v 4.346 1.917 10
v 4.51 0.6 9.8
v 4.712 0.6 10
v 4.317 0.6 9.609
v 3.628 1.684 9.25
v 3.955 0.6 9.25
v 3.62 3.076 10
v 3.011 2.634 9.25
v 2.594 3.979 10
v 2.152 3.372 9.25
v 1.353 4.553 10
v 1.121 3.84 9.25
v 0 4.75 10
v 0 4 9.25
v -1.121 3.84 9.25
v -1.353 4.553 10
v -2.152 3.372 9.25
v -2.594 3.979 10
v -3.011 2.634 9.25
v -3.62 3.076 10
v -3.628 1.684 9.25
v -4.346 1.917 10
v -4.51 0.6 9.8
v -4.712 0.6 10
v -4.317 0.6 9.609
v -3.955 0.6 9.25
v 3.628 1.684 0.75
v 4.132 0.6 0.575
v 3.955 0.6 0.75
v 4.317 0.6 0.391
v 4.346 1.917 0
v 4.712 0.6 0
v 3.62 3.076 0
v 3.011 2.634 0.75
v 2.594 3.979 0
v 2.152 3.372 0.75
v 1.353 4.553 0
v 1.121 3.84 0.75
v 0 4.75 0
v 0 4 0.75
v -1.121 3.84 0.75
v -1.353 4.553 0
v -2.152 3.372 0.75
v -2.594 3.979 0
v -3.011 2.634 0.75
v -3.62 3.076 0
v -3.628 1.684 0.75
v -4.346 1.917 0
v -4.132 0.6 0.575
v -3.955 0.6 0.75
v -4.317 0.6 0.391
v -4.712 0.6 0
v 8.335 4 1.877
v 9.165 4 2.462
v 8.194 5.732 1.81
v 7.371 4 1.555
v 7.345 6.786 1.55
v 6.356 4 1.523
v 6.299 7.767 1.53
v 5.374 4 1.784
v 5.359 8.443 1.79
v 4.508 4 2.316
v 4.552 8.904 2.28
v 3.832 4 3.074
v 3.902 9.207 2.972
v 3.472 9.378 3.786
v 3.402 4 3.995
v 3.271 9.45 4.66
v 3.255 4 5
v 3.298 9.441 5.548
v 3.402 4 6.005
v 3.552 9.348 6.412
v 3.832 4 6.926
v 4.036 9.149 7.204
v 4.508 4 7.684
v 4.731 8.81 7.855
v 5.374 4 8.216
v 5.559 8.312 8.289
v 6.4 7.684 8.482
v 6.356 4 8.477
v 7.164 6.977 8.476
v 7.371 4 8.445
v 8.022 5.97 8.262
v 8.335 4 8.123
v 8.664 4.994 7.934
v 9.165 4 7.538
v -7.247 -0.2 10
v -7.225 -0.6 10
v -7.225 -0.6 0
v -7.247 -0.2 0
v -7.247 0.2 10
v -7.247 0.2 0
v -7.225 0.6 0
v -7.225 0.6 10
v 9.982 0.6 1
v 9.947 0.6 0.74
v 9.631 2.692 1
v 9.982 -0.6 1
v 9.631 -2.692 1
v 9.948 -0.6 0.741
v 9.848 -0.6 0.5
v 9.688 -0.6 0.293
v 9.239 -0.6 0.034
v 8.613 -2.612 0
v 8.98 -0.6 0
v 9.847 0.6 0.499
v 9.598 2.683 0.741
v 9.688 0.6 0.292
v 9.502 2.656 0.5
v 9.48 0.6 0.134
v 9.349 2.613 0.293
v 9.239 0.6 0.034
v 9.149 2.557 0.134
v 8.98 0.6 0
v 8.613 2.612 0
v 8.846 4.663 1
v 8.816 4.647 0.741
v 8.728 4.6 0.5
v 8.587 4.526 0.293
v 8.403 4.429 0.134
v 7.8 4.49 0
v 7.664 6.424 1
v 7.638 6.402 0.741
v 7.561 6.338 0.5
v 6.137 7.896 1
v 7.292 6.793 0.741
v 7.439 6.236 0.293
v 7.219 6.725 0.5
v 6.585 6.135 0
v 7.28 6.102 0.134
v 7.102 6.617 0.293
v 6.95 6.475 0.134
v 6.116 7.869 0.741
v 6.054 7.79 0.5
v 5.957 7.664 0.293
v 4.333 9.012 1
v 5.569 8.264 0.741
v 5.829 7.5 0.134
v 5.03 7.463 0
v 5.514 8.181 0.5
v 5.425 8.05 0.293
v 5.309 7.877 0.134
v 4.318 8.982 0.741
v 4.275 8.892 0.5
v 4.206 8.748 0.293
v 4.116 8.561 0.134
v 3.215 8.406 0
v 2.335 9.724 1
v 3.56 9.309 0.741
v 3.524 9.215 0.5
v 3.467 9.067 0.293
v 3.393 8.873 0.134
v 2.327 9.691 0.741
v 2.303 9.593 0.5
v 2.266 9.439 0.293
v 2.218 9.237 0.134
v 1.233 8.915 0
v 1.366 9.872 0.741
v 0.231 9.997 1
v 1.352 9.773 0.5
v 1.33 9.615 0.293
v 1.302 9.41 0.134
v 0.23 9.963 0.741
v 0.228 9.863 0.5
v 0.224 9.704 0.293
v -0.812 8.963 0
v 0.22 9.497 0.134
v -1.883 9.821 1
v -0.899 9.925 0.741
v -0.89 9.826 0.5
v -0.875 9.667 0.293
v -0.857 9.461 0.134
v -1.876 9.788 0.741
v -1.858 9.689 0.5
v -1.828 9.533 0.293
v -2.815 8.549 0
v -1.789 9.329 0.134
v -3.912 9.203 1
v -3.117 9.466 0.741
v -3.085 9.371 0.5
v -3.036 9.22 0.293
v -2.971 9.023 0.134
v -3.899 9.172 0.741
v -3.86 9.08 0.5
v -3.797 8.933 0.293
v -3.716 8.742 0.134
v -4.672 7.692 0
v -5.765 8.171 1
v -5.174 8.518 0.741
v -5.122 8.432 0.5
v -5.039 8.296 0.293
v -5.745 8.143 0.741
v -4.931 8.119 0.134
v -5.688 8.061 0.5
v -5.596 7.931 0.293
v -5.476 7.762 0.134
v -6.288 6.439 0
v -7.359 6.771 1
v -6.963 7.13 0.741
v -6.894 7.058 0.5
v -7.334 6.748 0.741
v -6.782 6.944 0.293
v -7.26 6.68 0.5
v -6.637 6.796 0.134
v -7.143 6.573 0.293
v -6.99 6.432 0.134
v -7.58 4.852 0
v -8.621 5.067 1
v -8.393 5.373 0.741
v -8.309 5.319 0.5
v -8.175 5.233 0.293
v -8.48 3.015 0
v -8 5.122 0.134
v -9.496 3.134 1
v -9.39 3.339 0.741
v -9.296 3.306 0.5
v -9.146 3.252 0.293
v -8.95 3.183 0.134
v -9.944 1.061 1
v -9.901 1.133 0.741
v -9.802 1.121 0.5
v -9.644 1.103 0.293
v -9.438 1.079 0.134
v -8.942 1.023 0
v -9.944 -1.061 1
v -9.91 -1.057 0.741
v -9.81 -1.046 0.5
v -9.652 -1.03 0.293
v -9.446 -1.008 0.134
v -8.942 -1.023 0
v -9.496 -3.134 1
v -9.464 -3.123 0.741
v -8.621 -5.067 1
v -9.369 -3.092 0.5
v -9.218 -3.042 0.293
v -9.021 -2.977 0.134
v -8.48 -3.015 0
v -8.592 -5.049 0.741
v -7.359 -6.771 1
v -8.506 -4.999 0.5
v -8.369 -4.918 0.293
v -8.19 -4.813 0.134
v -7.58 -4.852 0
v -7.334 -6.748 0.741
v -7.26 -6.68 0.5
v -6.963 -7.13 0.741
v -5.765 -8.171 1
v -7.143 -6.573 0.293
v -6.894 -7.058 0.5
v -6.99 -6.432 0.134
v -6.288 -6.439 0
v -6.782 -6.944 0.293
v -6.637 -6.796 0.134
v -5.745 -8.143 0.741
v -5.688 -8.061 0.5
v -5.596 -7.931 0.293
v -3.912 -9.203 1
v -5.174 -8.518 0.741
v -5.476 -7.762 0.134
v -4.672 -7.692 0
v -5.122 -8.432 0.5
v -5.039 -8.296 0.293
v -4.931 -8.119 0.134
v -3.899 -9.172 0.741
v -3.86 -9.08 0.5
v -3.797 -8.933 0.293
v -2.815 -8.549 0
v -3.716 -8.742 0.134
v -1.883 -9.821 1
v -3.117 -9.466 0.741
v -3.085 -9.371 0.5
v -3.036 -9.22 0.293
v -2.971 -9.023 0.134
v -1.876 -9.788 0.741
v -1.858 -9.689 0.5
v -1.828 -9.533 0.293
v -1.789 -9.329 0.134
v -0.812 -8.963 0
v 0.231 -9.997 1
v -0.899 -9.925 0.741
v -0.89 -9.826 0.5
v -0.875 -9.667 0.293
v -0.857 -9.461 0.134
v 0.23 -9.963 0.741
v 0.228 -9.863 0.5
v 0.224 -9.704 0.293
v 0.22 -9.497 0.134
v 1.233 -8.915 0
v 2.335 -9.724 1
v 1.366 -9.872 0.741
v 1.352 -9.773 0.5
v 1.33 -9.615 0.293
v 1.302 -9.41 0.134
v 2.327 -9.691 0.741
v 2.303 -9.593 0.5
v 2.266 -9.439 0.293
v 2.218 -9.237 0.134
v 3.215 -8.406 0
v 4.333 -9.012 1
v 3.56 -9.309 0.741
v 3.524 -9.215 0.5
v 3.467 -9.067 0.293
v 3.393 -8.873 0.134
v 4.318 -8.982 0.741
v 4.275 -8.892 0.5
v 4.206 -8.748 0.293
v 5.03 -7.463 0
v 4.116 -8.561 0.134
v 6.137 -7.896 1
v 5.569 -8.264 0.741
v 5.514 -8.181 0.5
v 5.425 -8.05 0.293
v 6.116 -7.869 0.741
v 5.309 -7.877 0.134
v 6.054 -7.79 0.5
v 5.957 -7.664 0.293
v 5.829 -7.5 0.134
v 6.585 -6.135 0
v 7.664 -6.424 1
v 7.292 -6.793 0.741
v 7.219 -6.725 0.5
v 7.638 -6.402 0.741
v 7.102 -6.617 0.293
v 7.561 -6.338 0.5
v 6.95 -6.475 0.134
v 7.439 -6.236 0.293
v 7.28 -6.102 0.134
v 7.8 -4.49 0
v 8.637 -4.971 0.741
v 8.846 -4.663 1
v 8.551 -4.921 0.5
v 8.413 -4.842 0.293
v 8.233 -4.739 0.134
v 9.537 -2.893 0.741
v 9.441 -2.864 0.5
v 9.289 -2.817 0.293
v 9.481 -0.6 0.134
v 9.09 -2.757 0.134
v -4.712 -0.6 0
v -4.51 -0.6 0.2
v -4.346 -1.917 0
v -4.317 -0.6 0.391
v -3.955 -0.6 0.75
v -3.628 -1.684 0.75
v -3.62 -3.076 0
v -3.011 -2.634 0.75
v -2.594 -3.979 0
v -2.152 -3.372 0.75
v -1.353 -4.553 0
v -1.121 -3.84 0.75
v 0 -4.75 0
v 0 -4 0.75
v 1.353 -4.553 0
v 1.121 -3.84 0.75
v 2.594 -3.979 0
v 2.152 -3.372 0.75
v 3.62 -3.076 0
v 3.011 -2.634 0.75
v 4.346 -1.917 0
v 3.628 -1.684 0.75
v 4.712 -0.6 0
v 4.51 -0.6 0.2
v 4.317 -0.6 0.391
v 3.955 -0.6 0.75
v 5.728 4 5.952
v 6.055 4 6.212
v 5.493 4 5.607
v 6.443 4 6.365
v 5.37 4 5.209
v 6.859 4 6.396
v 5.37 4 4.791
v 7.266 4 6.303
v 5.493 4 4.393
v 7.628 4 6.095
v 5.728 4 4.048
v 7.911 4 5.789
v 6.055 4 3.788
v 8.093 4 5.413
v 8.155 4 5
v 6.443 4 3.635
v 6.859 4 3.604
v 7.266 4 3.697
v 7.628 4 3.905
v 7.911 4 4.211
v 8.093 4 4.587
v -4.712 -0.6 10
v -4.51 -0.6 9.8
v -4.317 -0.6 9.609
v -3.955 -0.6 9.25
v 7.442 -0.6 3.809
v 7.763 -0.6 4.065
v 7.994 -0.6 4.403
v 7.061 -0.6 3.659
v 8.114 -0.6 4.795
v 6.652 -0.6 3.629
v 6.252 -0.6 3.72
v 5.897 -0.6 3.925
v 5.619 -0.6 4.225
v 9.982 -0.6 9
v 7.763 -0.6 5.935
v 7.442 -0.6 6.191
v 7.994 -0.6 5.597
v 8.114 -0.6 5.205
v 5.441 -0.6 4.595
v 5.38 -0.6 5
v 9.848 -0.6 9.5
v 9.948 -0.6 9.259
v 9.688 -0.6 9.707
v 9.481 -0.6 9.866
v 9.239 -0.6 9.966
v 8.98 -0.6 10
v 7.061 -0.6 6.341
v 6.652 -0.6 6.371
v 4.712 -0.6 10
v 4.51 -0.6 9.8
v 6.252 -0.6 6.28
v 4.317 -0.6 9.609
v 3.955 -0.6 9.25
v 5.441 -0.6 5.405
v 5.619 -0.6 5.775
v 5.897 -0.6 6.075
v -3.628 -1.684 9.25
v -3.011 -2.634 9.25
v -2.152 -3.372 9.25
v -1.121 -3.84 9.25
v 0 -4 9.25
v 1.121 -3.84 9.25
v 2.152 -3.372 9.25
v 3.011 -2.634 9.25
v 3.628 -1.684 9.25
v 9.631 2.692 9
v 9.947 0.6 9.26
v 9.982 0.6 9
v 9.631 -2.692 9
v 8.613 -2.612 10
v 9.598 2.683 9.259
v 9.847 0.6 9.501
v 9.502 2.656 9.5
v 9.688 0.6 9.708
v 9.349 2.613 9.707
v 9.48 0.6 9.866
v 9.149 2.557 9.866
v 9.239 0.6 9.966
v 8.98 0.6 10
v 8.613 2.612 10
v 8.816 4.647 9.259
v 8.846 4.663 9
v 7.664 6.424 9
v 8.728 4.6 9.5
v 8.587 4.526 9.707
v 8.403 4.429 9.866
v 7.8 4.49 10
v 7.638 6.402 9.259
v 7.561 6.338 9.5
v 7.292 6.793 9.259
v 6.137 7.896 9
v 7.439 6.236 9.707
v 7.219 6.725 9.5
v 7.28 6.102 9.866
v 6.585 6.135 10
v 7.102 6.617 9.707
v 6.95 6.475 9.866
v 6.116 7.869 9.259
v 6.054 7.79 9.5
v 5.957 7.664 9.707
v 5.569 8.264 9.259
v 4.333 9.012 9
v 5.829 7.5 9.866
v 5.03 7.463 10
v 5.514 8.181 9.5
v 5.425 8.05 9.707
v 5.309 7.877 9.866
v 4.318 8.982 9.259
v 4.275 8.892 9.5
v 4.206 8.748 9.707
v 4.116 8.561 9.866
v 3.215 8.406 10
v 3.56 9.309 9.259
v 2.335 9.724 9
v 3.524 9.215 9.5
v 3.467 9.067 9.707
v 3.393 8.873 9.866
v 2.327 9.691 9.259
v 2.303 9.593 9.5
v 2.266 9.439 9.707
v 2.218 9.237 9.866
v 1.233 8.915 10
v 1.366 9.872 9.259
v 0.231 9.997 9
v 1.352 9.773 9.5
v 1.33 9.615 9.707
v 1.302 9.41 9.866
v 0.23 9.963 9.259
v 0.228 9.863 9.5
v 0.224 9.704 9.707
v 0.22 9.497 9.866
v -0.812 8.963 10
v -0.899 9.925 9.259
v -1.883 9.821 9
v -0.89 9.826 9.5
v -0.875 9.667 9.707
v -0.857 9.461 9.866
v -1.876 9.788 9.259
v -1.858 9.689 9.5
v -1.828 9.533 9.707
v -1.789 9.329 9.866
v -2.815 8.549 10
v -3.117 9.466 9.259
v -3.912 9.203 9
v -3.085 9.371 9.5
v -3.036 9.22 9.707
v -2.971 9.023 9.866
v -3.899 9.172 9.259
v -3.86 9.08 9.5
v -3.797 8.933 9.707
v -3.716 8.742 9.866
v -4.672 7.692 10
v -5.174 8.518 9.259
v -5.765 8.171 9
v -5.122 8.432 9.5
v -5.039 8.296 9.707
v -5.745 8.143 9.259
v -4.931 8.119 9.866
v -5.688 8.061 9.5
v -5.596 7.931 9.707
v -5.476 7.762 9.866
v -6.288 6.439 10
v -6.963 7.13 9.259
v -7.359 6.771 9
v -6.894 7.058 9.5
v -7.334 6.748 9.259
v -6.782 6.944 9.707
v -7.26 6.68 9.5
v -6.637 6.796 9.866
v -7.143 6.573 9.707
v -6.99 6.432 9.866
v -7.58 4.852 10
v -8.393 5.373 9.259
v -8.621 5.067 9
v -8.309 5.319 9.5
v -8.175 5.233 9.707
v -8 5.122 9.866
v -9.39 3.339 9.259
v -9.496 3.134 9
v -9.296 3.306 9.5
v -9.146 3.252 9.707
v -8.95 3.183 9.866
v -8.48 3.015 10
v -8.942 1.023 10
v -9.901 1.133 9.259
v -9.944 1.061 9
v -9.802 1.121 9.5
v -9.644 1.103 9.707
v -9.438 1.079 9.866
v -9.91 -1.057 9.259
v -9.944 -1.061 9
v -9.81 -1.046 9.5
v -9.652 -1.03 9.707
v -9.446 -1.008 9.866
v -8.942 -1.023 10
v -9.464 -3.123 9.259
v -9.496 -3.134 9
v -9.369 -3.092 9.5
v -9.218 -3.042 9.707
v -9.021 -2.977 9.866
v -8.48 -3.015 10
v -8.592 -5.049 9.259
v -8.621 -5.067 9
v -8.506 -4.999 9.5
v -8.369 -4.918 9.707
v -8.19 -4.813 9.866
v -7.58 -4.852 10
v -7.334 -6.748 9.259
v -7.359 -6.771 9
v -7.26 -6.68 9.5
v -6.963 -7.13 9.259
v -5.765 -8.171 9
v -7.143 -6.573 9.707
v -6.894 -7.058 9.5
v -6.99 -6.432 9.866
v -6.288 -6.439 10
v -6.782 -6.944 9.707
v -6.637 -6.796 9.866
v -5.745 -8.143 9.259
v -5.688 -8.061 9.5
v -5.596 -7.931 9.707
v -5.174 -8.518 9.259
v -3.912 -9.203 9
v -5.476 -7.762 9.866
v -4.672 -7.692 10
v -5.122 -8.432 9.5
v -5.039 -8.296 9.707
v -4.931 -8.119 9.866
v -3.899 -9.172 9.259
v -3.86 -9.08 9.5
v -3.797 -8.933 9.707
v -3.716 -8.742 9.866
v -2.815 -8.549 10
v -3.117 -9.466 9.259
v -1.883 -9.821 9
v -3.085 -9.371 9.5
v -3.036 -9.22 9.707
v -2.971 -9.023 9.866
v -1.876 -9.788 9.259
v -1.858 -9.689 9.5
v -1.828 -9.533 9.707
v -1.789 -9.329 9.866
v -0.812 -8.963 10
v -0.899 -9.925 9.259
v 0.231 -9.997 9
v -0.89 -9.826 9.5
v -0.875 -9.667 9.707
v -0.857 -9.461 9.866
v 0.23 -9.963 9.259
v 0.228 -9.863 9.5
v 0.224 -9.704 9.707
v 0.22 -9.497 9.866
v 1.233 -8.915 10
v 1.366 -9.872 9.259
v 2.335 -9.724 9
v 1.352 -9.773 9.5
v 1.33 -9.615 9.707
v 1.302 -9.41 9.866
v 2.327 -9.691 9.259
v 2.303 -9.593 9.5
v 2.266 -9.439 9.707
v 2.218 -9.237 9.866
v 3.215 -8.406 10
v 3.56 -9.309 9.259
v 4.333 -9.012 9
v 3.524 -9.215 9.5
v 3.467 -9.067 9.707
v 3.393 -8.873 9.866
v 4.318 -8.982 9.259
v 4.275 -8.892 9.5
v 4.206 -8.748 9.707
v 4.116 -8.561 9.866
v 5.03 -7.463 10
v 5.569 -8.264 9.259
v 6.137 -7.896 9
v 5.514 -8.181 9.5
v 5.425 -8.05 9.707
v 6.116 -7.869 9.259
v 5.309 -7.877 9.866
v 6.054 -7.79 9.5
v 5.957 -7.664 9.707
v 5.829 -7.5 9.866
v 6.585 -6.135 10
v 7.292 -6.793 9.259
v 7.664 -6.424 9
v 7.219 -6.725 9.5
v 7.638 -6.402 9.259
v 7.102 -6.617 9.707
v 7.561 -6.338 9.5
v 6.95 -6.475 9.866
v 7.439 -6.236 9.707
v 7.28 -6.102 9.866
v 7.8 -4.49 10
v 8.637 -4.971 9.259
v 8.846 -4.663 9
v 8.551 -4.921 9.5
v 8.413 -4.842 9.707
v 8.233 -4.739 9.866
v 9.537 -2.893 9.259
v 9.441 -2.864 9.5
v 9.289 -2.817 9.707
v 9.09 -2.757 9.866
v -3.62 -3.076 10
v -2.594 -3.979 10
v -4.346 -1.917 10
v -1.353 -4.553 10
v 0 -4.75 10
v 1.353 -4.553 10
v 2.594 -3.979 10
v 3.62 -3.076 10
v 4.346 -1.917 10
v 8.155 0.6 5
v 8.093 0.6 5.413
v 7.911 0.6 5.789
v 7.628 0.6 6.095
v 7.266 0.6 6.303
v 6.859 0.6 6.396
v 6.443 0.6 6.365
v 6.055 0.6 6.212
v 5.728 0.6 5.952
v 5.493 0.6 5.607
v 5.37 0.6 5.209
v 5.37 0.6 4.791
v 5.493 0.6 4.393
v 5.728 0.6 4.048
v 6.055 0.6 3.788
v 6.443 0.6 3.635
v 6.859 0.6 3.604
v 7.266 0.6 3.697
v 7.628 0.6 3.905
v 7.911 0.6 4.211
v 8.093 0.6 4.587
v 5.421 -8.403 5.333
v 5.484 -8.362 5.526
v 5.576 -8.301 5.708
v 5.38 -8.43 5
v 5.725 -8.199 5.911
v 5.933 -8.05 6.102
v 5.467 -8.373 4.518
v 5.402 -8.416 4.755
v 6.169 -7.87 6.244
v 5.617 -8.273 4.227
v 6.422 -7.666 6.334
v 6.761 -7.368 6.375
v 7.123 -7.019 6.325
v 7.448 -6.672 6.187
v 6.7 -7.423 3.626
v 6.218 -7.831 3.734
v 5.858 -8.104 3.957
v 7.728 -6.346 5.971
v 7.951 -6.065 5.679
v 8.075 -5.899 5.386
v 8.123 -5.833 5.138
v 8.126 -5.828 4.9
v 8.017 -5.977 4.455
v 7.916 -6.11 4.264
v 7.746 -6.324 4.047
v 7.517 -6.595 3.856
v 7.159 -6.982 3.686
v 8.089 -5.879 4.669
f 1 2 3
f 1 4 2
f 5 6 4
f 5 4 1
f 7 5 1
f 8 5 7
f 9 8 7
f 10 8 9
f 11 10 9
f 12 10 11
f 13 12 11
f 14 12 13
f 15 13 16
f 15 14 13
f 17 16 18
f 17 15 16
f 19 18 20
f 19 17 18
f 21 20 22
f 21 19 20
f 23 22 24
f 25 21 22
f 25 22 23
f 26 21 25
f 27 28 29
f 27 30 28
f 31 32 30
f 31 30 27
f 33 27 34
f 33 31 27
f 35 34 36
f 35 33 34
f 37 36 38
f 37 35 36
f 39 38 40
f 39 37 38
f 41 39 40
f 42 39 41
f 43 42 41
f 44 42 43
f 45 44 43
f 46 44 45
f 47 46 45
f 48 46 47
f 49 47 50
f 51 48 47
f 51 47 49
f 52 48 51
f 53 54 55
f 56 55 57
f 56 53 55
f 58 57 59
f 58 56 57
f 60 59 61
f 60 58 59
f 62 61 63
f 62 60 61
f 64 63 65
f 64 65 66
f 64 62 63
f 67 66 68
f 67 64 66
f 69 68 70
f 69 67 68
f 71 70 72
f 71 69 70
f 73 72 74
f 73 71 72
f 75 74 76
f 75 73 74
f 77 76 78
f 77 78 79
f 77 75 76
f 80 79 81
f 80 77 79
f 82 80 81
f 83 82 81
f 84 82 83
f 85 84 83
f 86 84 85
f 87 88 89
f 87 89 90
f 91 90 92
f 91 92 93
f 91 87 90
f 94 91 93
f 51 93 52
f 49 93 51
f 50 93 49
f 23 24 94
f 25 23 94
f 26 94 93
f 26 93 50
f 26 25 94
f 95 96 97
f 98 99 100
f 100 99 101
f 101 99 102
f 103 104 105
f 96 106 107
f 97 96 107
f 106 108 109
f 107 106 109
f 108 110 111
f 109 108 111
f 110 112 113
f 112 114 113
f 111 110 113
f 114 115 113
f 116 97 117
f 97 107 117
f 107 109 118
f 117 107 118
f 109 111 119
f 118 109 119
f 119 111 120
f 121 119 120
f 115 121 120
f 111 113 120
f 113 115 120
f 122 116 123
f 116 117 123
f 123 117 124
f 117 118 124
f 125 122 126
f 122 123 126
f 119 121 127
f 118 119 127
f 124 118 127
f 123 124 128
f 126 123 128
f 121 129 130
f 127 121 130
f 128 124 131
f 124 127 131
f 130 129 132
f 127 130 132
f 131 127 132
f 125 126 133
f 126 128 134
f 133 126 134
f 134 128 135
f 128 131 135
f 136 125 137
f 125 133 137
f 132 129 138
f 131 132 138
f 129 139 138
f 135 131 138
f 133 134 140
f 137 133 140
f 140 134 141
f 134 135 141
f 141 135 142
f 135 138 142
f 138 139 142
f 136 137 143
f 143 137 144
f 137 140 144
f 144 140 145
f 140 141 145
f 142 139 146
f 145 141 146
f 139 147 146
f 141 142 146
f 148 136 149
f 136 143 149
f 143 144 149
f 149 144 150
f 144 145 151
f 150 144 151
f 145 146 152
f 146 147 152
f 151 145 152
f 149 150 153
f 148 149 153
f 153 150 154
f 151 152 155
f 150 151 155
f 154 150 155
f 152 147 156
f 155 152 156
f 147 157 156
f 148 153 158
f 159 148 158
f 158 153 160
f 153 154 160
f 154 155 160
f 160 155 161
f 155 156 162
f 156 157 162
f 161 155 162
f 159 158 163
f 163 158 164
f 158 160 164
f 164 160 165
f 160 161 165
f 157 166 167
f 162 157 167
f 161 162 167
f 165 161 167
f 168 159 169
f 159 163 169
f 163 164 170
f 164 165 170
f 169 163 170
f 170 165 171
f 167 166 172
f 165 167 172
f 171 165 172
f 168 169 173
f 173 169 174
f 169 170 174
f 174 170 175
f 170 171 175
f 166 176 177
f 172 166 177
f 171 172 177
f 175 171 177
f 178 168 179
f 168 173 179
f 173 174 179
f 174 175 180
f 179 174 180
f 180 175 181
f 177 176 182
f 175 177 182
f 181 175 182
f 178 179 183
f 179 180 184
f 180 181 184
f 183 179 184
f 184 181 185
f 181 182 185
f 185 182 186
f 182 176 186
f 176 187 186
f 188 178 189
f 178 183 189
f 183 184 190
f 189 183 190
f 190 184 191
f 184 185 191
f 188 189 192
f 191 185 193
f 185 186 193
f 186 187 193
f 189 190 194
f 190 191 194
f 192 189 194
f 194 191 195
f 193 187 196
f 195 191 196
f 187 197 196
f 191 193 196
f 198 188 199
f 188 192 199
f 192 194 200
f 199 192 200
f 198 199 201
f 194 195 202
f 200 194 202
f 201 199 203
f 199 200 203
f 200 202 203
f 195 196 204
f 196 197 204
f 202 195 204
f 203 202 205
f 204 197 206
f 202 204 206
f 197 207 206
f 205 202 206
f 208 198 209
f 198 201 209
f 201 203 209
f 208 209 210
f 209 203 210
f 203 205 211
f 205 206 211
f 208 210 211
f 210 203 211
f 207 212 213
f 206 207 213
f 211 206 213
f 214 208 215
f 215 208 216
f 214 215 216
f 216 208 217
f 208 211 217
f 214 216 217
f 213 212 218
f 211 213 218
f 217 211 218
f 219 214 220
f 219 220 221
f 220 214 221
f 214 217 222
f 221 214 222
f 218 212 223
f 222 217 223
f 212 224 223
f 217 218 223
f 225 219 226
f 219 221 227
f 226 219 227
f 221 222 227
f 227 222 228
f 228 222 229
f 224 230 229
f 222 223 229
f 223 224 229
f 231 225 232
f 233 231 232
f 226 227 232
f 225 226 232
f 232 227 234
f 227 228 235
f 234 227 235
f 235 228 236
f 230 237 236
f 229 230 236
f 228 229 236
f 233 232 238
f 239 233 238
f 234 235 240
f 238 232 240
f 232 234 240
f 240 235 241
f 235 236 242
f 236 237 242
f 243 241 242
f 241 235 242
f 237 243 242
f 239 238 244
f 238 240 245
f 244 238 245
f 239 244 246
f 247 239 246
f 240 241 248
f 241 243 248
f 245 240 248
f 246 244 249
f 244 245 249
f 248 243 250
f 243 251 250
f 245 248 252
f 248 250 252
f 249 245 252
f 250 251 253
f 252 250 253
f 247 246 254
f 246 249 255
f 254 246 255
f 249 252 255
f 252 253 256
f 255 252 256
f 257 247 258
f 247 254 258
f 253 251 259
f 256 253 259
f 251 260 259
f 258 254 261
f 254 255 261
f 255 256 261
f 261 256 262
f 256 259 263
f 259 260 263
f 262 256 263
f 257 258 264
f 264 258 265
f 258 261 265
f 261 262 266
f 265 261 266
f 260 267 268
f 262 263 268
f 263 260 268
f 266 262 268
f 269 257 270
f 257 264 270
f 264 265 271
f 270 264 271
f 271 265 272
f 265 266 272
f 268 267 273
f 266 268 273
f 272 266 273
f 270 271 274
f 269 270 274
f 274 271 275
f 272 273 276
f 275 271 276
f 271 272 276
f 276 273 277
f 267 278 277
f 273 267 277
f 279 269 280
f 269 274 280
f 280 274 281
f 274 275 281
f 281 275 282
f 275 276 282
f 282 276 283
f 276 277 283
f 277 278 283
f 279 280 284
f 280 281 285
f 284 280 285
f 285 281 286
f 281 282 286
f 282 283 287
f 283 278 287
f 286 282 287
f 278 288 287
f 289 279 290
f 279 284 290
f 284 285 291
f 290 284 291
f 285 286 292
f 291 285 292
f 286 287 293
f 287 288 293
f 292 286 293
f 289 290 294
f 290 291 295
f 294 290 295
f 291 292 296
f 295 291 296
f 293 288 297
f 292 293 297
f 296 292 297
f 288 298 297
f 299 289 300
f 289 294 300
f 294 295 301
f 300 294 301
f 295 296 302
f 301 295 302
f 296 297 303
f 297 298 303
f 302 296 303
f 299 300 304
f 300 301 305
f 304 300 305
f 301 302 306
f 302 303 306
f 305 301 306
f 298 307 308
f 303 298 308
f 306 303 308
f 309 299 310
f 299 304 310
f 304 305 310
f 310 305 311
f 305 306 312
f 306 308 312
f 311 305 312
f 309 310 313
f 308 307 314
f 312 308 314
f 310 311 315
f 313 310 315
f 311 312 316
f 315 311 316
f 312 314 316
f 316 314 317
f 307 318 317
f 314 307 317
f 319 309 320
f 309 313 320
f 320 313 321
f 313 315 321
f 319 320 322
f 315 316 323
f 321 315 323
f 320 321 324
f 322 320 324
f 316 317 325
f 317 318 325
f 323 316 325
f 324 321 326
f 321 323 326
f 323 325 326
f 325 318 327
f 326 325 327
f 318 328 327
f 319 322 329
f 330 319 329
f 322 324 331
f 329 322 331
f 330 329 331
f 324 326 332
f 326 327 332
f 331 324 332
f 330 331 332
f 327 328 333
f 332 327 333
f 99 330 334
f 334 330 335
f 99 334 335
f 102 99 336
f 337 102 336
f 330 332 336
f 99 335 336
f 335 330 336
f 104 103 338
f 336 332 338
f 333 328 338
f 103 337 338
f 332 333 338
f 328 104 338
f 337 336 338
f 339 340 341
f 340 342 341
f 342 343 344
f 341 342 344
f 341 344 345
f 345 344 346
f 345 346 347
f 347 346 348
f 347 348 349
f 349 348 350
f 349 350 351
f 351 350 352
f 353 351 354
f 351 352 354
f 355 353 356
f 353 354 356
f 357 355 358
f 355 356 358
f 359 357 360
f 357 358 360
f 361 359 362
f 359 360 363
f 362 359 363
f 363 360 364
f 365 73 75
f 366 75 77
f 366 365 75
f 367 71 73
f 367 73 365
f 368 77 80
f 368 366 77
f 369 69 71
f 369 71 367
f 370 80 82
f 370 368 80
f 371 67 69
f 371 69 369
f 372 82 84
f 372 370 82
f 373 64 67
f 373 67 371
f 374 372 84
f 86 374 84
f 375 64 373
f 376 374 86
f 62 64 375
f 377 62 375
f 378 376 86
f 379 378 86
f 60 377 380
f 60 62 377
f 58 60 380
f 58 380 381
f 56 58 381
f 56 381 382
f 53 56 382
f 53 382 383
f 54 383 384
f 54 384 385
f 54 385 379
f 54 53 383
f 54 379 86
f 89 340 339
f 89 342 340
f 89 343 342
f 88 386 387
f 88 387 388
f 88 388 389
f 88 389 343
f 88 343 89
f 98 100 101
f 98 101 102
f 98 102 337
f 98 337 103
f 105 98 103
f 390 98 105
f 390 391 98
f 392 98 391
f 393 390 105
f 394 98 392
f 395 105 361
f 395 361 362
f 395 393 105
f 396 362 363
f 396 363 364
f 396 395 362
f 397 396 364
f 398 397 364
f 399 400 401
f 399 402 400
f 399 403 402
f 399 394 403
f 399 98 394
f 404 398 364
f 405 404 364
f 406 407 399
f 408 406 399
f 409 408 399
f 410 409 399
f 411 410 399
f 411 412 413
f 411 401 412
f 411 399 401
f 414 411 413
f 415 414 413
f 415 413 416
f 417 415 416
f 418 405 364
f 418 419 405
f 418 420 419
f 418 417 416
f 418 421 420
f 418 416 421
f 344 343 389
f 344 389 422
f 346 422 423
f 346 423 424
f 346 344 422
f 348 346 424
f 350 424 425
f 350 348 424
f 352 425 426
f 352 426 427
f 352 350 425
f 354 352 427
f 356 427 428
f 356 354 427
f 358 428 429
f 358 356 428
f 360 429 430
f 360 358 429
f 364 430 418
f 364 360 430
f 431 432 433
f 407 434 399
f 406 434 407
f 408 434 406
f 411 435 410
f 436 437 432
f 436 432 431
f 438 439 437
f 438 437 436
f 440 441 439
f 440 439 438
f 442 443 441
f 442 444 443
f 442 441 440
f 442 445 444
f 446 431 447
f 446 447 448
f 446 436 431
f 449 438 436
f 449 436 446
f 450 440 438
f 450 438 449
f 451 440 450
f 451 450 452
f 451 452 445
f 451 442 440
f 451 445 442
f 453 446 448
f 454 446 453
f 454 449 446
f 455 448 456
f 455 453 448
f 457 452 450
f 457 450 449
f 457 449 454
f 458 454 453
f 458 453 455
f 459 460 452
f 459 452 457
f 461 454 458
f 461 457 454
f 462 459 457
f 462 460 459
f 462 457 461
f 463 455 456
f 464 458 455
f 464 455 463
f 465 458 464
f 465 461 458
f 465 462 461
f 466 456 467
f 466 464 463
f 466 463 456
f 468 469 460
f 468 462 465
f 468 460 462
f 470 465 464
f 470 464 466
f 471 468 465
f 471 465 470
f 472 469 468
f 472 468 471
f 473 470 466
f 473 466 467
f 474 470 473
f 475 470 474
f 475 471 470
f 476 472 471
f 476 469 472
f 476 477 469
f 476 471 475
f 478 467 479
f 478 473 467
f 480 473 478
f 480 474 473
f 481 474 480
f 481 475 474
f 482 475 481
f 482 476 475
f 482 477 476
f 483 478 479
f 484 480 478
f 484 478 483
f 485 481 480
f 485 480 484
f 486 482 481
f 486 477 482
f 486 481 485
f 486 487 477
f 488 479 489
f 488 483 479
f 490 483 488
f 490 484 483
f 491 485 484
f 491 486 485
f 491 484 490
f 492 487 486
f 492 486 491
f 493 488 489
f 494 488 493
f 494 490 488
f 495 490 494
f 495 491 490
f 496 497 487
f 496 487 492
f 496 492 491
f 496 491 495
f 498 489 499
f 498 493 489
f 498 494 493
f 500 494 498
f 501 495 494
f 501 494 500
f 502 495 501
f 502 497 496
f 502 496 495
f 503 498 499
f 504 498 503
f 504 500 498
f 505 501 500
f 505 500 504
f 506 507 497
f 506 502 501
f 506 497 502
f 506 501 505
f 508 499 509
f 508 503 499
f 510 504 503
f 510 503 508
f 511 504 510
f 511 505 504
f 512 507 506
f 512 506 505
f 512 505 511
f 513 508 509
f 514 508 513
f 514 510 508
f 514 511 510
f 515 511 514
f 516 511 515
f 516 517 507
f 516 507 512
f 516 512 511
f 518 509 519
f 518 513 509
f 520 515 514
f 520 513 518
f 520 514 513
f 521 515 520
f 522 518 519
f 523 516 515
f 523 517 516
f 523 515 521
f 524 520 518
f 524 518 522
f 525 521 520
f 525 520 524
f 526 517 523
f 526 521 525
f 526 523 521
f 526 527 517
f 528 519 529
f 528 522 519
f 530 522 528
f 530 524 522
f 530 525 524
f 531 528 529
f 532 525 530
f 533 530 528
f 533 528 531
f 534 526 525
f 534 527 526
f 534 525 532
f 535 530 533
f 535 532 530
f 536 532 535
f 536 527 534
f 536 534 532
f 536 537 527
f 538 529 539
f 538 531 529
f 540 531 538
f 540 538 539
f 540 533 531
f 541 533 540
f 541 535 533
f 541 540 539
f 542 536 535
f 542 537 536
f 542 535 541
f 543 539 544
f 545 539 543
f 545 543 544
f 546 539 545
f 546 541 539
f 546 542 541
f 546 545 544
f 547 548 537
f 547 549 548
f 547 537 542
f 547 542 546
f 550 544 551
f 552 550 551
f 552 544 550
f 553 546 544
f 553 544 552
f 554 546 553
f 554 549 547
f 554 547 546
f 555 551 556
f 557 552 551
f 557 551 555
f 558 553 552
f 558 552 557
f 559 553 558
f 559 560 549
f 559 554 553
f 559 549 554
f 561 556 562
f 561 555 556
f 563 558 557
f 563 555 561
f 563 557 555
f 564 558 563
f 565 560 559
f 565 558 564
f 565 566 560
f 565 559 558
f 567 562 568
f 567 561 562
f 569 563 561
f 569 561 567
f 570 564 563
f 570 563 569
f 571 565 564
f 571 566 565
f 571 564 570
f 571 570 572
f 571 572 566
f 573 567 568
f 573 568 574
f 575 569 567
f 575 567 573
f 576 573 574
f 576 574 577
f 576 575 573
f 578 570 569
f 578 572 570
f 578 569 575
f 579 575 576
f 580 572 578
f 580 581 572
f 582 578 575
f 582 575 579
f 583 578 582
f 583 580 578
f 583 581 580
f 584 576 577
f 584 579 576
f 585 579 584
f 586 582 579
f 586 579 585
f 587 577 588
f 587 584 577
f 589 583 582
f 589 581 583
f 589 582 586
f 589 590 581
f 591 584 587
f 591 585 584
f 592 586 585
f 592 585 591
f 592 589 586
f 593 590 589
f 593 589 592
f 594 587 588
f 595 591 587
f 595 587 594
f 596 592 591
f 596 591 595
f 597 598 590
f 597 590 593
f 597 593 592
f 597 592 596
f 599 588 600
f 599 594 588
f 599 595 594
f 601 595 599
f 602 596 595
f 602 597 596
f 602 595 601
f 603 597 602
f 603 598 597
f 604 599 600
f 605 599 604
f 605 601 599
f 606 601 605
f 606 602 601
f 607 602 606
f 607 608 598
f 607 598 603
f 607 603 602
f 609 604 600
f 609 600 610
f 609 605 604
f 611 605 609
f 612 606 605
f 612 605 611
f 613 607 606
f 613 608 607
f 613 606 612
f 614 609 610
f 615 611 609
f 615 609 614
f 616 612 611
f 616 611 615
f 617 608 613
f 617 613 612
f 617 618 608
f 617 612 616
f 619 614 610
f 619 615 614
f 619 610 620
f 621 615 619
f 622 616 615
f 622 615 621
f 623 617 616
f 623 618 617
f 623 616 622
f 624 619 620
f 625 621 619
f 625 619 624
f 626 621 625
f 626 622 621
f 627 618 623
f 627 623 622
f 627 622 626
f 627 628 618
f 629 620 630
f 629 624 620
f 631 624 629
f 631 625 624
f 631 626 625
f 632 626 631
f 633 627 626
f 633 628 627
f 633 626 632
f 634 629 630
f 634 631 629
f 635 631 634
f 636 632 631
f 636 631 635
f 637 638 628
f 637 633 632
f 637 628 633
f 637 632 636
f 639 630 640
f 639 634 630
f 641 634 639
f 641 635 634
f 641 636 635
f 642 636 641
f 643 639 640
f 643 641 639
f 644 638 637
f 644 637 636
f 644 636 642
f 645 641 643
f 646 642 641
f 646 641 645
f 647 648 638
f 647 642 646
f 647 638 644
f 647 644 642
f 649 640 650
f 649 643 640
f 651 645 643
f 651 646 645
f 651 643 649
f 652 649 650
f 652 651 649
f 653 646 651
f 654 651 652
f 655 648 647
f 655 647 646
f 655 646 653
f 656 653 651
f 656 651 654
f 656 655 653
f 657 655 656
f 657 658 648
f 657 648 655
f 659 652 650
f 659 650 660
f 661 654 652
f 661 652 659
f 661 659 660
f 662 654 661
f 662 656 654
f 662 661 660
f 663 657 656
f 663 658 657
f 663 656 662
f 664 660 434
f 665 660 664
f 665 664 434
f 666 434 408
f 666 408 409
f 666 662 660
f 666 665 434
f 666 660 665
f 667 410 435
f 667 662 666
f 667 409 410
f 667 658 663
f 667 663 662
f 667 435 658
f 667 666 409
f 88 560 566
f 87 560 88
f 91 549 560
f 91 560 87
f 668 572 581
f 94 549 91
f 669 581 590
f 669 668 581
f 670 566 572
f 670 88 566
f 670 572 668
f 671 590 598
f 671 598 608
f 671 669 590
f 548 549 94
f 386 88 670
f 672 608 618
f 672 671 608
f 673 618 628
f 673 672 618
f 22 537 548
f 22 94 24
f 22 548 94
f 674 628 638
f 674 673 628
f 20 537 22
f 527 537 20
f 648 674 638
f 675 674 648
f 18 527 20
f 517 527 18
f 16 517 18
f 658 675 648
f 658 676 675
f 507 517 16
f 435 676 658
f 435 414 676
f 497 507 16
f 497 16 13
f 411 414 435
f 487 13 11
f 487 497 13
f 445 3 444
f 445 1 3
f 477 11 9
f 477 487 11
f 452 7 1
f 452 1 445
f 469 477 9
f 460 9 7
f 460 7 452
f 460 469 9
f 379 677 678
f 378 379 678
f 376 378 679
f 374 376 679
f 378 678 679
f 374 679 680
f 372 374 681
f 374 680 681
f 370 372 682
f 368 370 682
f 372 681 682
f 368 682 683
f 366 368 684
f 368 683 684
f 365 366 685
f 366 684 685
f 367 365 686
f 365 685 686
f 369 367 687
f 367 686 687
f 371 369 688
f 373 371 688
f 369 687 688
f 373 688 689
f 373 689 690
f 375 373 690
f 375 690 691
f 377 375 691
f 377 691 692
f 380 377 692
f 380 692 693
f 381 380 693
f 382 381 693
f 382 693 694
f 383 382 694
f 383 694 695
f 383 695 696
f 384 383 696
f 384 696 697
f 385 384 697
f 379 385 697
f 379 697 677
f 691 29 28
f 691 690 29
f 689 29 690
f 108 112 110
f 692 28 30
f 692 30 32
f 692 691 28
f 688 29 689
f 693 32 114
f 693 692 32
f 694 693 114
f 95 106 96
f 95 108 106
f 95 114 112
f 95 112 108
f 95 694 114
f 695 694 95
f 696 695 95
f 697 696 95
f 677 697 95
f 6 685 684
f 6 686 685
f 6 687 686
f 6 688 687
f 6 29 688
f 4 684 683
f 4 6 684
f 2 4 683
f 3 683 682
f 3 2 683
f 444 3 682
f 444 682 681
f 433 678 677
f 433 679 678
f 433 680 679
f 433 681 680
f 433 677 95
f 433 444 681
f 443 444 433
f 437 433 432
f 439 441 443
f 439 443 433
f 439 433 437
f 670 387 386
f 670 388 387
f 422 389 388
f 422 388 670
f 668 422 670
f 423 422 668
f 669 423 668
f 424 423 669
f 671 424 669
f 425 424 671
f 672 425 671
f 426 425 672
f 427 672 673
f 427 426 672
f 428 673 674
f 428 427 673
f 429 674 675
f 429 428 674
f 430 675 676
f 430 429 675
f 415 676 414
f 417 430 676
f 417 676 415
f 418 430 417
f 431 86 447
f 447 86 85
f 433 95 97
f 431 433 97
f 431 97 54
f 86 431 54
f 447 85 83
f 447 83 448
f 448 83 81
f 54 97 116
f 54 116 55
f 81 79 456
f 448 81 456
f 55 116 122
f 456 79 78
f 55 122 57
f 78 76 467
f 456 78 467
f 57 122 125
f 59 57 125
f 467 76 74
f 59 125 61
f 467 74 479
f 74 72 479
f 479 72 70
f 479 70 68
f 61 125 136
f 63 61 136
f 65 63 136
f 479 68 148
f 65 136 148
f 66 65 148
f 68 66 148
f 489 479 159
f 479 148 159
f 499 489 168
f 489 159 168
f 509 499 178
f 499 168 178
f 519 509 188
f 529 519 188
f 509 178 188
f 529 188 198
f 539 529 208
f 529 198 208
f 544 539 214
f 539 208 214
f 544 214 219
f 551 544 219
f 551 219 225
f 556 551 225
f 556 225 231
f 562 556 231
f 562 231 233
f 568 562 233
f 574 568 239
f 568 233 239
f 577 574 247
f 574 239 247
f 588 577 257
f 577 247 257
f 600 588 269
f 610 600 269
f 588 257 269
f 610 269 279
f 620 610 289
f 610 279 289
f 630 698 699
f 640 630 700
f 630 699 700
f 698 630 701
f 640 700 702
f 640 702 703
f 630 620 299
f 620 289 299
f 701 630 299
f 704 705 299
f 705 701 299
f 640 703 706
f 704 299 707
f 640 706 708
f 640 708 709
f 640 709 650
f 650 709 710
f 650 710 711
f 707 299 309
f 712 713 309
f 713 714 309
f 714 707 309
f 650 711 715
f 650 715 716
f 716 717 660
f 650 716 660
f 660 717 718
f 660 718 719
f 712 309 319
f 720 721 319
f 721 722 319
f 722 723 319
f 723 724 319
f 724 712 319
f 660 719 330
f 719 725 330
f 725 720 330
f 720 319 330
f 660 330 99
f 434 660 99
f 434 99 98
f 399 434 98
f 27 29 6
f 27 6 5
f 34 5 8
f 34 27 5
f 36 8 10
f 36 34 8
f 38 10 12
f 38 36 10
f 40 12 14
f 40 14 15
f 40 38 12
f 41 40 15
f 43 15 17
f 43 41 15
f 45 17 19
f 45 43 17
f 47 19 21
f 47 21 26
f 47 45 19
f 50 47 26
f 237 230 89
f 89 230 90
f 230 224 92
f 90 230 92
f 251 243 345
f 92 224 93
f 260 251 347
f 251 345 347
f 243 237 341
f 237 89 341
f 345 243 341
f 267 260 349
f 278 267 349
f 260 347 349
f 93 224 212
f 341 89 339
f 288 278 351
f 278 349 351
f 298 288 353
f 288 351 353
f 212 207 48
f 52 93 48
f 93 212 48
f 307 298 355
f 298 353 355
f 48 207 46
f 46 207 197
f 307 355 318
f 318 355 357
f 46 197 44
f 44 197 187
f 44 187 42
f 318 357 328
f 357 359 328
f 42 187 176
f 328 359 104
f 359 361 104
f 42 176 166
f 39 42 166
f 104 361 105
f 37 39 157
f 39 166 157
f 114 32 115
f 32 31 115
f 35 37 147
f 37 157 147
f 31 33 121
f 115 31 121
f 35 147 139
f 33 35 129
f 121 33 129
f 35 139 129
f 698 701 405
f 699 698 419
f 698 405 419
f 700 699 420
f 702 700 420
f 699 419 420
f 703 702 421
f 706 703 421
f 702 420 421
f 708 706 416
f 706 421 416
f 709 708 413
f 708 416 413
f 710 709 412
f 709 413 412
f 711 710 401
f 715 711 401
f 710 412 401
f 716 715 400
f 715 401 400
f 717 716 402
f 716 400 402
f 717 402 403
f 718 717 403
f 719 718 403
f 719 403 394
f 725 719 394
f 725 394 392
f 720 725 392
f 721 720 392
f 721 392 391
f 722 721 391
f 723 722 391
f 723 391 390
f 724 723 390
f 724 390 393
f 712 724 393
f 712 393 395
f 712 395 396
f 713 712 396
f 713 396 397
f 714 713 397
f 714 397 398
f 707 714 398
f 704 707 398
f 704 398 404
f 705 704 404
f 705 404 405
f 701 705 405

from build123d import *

# Parameters (mm, degrees)
SKICA1_R                 = 10
SKICA1_R_2               = 4
P_IDAT_VYSUNUT_M1_DEPTH  = 10
ODEBRAT_VYSUNUT_M1_DEPTH = 10
SKICA3_R                 = 1.375
ODEBRAT_VYSUNUT_M2_DEPTH = 10
SKICA4_R                 = 1.4
ODEBRAT_VYSUNUT_M3_DEPTH = 10
SKICA5_R                 = 3.5
ODEBRAT_VYSUNUT_M4_DEPTH = 10
ZAOBLIT1_R               = 1
ZKOSEN_2_SIZE            = 0.75


with BuildPart() as part:
    # Skica1 → Přidat vysunutím1 (new body)
    with BuildSketch(Plane.XY):
        Circle(SKICA1_R)
        Circle(SKICA1_R_2, mode=Mode.SUBTRACT)
    extrude(amount=P_IDAT_VYSUNUT_M1_DEPTH)

    # Skica2 → Odebrat vysunutím1 (cut)
    with BuildSketch(Plane.XY.offset(10)):
        with BuildLine():
            Line((-7.225129757, 0.6), (12.11079591, 0.6))
            Line((12.11079591, 0.6), (12.11079591, -0.6))
            Line((12.11079591, -0.6), (-7.225129757, -0.6))
            ThreePointArc((-7.225129757, -0.6), (-7.25, 0), (-7.225129757, 0.6))
        make_face()
    extrude(amount=-ODEBRAT_VYSUNUT_M1_DEPTH, mode=Mode.SUBTRACT)

    # Skica3 → Odebrat vysunutím2 (cut)
    with BuildSketch(Plane(origin=(0, -0.6, 0), x_dir=(1, 0, 0), z_dir=(0, 1, 0))):
        with Locations(Location((6.754743987, -5, 0), (0, 0, 180))):
            Circle(SKICA3_R)
    extrude(amount=-ODEBRAT_VYSUNUT_M2_DEPTH, mode=Mode.SUBTRACT)

    # Skica4 → Odebrat vysunutím3 (cut)
    with BuildSketch(Plane.XZ.offset(-0.6)):
        with Locations((6.754743987, 5)):
            Circle(SKICA4_R)
    extrude(amount=-ODEBRAT_VYSUNUT_M3_DEPTH, mode=Mode.SUBTRACT)

    # Skica5 → Odebrat vysunutím4 (cut)
    with BuildSketch(Plane(origin=(0, 4, 0), x_dir=(1, 0, 0), z_dir=(0, 1, 0))):
        with Locations((6.754743987, -5)):
            Circle(SKICA5_R)
    extrude(amount=ODEBRAT_VYSUNUT_M4_DEPTH, mode=Mode.SUBTRACT)

    # Zaoblit1
    zaoblit1_edges = [part.edges().sort_by_distance(p)[0] for p in [
        (-10, 0, 0),
        (-10, 0, 10),
    ]]
    fillet(zaoblit1_edges, radius=ZAOBLIT1_R)

    # Zkosení2
    zkosen_2_edges = [part.edges().sort_by_distance(p)[0] for p in [
        (0, -4, 10),
        (0, -4, 0),
        (0, 4, 0),
        (0, 4, 10),
    ]]
    chamfer(zkosen_2_edges, length=ZKOSEN_2_SIZE)


solid = part.part
